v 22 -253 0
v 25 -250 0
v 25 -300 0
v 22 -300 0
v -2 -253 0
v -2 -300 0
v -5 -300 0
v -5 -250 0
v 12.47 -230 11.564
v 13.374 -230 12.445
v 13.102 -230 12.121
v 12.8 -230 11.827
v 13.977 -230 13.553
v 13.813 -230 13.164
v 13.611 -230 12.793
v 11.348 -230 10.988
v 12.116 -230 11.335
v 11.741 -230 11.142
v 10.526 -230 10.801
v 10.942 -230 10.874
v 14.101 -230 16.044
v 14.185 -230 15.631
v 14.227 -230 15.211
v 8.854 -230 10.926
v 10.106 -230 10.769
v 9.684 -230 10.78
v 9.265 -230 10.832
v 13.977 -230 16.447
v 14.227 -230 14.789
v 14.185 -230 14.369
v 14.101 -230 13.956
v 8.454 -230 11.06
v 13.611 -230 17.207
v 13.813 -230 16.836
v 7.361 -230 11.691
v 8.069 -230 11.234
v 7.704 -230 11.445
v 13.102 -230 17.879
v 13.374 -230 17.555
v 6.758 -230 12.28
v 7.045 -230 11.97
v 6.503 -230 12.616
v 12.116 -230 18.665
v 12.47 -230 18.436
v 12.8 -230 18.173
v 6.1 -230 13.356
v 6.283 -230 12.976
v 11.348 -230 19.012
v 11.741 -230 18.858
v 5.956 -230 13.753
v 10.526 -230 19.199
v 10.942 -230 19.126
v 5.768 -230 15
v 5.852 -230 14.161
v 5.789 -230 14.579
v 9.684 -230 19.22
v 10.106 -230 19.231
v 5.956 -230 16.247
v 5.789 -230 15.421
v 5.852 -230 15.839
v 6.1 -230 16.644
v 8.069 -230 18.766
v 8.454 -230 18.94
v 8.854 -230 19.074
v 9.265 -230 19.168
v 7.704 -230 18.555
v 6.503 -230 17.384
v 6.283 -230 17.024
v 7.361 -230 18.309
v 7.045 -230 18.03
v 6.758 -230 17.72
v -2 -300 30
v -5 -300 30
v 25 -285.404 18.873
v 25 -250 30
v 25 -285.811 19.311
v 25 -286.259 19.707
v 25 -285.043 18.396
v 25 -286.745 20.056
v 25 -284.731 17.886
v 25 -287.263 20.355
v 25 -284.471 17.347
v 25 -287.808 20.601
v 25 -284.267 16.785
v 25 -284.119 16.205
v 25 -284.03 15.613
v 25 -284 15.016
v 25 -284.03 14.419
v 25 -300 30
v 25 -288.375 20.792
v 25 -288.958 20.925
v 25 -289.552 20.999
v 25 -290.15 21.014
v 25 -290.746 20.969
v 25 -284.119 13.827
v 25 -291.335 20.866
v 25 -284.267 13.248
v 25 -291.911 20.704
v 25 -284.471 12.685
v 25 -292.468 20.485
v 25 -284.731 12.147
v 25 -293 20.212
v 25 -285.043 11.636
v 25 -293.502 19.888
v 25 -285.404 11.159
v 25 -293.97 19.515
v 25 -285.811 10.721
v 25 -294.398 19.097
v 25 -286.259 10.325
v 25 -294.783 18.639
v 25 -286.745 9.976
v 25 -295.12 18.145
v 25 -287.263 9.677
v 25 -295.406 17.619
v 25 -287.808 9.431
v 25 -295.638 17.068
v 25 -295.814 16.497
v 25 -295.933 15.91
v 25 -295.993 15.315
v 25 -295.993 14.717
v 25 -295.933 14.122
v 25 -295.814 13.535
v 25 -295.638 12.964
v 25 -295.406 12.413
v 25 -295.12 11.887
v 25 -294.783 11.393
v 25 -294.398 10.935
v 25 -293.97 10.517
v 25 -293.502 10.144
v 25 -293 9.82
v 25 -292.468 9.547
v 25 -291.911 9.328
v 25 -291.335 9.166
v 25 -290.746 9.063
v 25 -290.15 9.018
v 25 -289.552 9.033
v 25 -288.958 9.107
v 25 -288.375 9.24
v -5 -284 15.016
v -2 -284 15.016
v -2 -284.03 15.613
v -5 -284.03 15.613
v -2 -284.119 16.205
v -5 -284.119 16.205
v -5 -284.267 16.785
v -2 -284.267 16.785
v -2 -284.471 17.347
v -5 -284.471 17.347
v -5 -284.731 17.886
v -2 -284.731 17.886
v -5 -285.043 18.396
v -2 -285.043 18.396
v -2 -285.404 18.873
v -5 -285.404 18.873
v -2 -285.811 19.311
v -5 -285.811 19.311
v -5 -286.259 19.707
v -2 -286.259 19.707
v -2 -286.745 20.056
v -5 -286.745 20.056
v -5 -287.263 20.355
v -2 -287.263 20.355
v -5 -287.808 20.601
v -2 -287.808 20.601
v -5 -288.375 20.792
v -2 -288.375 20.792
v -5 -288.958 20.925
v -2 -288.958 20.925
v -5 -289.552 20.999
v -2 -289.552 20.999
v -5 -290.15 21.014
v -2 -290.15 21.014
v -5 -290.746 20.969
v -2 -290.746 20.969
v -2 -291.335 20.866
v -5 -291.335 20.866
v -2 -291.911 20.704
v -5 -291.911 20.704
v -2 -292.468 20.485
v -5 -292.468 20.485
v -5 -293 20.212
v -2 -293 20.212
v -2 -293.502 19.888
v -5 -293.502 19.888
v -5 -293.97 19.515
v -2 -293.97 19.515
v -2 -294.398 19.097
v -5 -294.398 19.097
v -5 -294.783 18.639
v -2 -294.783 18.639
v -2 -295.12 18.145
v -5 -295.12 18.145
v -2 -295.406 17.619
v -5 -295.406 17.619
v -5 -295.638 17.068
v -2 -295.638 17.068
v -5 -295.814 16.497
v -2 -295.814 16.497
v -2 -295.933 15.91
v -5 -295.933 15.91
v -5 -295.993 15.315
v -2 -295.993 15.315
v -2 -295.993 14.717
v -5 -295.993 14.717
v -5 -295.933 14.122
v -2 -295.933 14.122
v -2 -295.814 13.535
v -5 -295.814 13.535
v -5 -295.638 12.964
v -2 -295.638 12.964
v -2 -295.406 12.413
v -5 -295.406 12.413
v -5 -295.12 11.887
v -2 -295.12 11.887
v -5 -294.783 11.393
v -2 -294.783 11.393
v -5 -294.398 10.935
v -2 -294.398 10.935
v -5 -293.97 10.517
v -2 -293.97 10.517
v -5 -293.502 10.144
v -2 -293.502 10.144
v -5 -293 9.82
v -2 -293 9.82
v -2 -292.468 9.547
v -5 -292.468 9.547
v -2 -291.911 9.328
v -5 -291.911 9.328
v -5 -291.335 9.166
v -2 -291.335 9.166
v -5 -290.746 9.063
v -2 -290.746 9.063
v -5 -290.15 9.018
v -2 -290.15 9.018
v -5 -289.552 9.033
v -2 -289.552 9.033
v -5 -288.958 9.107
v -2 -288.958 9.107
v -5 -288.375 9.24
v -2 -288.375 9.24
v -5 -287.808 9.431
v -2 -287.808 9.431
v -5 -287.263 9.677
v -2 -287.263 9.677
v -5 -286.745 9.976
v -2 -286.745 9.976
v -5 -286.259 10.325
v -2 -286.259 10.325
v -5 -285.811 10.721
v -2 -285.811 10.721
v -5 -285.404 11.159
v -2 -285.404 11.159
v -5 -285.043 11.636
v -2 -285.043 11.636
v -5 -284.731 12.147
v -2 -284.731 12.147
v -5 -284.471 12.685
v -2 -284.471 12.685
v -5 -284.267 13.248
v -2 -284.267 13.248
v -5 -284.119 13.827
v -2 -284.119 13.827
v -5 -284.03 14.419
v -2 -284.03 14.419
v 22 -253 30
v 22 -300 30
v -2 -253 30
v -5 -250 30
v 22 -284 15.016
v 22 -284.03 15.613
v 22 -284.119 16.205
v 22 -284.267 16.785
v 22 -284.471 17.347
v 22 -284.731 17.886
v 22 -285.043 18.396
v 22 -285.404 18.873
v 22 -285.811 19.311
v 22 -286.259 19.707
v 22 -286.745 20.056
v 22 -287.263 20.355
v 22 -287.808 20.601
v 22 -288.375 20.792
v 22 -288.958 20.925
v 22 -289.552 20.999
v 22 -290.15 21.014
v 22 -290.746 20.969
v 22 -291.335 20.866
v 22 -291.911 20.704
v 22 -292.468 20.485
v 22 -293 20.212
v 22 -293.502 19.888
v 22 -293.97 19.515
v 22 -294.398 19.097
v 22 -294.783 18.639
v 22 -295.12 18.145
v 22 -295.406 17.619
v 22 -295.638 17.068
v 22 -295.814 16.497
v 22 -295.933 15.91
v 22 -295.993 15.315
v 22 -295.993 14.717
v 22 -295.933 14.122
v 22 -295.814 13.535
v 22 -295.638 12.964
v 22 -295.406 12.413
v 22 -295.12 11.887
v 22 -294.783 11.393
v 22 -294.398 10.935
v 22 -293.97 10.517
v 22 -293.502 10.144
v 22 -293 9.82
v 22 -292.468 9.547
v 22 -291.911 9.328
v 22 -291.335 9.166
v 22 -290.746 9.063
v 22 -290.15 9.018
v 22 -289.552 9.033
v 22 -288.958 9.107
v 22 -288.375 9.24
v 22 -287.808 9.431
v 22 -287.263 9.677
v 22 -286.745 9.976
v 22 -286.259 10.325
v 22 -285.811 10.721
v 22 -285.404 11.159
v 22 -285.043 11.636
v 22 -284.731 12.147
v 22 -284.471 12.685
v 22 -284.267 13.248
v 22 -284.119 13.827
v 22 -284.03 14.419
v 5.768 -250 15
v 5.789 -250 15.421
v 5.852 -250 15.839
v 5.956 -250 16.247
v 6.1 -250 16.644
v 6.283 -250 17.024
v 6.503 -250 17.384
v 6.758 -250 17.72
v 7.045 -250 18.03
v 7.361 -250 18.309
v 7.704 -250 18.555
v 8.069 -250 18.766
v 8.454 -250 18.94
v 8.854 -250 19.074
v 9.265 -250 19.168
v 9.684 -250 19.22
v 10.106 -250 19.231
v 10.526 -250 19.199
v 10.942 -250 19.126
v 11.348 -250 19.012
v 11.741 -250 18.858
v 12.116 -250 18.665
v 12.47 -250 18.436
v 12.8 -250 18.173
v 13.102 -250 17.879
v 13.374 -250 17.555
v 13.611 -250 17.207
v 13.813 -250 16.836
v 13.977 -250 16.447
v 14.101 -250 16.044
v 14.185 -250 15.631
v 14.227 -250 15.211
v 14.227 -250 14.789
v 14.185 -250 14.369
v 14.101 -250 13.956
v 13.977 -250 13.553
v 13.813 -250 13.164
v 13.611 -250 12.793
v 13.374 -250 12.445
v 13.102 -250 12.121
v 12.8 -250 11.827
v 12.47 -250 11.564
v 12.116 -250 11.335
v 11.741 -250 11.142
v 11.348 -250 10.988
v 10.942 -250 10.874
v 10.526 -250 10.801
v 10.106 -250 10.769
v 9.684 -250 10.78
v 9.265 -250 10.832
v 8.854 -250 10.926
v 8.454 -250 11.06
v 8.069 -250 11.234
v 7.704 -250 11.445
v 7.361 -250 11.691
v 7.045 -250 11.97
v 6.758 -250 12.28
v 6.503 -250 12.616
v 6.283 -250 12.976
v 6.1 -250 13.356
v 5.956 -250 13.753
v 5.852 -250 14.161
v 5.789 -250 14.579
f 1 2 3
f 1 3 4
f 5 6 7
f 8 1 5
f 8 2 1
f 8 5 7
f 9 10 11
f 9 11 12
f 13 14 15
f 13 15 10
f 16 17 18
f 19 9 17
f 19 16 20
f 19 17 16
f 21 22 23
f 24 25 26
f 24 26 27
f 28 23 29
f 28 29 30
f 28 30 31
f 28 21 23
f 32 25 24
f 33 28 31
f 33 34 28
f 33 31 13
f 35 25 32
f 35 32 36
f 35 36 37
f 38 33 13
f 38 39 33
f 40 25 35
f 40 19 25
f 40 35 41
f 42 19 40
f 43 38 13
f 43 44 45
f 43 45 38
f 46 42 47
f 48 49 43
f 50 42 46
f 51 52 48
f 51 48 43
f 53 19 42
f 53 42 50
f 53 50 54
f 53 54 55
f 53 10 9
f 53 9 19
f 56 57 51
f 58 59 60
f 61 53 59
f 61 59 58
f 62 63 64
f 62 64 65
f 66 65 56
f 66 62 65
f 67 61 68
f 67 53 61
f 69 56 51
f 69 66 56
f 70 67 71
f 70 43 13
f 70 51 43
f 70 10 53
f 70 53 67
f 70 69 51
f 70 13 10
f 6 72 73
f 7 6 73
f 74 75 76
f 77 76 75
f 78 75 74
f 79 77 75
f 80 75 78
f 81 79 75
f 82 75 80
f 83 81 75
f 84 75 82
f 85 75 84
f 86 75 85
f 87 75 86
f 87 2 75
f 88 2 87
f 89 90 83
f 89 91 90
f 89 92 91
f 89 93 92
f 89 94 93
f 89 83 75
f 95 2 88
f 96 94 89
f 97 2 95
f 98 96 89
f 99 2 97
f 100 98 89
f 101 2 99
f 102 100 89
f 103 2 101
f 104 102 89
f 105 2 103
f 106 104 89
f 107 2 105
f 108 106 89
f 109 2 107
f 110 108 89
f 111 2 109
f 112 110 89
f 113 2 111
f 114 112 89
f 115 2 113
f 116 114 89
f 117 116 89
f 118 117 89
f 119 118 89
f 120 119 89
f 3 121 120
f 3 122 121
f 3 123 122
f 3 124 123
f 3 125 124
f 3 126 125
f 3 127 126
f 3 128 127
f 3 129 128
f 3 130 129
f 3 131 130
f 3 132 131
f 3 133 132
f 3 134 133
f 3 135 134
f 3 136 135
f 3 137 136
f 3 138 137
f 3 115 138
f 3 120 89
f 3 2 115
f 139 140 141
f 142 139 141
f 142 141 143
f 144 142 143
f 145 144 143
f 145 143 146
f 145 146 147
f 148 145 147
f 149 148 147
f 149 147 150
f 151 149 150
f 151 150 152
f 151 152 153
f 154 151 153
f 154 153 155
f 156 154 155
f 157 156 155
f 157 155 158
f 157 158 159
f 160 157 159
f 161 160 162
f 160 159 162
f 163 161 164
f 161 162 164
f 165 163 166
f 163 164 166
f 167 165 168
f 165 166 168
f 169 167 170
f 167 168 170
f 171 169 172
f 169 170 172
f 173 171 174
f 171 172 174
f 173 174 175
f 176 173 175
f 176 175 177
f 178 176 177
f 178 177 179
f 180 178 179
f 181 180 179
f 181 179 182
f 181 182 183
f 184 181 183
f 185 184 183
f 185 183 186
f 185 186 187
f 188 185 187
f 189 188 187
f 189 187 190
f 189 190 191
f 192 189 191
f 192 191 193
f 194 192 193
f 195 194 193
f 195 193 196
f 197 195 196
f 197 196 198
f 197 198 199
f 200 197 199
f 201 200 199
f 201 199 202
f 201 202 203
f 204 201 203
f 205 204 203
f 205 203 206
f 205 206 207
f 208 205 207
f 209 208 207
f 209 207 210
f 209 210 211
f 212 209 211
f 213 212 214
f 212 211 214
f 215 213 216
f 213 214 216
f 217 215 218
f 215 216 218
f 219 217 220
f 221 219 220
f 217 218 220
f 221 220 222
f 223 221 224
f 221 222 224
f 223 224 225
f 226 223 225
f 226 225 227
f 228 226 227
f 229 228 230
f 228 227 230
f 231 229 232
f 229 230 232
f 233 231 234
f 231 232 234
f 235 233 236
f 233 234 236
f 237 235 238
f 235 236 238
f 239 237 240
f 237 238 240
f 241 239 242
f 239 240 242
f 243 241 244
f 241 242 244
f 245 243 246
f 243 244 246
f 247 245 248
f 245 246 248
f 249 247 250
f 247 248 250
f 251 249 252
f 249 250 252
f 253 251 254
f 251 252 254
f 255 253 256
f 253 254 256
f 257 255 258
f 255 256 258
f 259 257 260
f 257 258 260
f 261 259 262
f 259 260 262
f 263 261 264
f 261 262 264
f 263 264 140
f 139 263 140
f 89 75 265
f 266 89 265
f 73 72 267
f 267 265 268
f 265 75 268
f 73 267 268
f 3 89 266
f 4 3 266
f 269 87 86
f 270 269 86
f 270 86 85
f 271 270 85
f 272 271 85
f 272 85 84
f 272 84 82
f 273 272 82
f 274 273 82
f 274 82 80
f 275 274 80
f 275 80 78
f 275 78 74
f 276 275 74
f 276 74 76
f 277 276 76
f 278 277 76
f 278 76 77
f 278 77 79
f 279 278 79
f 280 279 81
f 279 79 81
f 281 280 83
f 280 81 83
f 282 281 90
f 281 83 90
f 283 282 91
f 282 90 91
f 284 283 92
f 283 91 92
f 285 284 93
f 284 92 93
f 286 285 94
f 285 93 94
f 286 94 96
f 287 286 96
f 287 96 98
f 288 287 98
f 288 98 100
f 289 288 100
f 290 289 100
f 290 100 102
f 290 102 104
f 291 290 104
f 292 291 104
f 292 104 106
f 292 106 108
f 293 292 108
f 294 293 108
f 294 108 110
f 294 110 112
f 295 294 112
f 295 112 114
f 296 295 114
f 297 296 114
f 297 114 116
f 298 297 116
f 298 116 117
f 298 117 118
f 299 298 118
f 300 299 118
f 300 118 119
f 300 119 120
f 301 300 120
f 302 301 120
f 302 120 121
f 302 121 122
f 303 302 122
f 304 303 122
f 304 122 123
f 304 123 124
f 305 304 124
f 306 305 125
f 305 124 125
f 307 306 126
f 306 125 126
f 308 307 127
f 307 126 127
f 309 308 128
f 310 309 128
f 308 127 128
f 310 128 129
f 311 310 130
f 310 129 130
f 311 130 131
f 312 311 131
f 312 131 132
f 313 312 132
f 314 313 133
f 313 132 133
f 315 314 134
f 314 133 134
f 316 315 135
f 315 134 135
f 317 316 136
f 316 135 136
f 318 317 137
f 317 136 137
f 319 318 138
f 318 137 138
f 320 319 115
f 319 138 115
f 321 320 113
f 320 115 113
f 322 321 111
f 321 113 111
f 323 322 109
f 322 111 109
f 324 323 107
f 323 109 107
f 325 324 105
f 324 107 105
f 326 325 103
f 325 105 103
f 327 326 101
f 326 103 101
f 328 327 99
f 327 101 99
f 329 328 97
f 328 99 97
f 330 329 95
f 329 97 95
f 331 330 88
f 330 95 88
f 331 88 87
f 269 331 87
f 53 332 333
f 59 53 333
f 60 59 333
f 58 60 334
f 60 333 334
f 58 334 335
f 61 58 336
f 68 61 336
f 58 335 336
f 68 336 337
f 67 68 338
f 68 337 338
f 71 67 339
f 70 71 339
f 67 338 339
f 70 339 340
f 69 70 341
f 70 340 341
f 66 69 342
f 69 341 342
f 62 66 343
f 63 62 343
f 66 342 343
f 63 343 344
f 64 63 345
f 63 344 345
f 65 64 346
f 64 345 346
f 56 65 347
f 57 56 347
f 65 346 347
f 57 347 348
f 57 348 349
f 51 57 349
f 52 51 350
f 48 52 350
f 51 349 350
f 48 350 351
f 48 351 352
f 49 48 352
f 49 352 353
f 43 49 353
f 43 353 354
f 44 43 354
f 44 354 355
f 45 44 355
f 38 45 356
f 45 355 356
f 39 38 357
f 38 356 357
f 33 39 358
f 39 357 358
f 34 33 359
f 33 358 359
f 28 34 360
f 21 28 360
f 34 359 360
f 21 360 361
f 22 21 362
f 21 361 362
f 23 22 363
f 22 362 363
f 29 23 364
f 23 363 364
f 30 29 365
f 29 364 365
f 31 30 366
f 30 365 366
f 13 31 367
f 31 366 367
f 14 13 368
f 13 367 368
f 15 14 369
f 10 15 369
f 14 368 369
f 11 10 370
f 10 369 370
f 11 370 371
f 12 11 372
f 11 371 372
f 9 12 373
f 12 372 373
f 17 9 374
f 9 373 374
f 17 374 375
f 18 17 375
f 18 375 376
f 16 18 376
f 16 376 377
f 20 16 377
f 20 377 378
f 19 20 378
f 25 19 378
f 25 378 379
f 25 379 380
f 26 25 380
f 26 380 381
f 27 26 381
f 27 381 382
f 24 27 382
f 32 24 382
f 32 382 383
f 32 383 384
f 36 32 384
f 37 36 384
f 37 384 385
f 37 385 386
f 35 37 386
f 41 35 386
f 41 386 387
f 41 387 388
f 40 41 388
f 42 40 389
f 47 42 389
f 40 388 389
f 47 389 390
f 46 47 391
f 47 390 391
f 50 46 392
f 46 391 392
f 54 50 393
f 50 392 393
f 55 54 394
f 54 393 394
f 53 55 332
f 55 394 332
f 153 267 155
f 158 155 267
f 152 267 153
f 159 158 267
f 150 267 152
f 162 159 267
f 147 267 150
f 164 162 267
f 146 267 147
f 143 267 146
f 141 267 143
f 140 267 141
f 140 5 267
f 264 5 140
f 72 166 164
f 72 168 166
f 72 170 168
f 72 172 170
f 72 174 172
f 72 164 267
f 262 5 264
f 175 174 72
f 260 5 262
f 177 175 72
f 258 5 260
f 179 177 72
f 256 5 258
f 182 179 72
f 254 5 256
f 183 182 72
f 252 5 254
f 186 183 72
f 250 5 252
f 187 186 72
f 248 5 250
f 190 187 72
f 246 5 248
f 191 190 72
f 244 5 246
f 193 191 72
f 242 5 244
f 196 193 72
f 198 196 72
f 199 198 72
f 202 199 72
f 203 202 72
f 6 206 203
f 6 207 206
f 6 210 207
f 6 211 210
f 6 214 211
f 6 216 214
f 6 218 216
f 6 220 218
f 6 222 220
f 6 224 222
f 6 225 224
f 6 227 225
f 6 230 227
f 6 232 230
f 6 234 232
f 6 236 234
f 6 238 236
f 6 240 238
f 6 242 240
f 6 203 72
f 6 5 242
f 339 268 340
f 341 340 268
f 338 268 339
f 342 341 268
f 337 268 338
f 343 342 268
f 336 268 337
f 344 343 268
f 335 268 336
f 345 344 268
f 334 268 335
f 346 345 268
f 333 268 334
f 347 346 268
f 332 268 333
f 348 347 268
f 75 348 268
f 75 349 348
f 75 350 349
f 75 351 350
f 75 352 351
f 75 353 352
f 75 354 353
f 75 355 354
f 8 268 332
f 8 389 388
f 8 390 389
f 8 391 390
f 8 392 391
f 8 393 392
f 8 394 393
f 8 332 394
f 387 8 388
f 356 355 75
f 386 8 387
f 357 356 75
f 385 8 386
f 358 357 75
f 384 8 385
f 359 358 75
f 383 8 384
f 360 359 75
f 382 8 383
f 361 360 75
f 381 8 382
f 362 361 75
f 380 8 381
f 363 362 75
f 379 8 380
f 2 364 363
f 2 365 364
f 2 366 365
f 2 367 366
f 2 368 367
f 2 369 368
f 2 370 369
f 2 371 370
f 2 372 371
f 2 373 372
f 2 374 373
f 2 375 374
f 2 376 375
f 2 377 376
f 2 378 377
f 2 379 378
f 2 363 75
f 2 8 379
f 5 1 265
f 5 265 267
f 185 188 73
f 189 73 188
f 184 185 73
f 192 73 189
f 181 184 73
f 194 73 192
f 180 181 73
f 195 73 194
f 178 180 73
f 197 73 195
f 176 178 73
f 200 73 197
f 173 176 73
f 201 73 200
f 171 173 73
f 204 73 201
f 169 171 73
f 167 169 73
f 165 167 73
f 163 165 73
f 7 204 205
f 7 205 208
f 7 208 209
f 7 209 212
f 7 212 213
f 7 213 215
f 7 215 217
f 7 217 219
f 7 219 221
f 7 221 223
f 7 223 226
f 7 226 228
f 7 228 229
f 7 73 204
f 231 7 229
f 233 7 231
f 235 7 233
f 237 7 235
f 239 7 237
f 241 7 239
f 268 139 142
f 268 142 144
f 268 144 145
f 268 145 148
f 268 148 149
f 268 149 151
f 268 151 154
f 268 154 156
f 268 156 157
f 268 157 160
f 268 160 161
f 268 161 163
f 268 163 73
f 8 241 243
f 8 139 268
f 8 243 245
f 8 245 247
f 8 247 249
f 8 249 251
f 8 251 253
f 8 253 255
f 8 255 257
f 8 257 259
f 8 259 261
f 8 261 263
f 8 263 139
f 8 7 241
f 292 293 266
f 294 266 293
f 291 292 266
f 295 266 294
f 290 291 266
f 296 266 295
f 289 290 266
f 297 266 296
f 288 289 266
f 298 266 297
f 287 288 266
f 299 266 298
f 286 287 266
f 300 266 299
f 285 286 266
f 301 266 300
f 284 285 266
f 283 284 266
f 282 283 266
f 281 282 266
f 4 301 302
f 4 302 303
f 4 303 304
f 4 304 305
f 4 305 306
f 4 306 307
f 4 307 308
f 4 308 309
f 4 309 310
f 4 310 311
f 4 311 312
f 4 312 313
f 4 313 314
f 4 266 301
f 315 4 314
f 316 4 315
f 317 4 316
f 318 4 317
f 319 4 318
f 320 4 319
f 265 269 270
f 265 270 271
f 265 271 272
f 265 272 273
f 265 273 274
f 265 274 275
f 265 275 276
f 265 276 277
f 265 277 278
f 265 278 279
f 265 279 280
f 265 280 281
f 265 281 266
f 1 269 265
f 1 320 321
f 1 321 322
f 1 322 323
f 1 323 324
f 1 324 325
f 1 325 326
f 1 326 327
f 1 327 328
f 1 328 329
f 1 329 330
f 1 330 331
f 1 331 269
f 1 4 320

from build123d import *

# Parameters (mm, degrees)
PAD003_DEPTH = 30
SKETCH005_R  = 6
POCKET_DEPTH = 30.001
SKETCH006_R  = 4.232151
PAD004_DEPTH = 20


with BuildPart() as part:
    # Sketch004 → Pad003 (new body)
    with BuildSketch(Plane.XY):
        Polygon((-12, 0), (-15, 0), (-15, 50), (15, 50), (15, 0), (12, 0), (12, 47), (-12, 47), align=None)
    extrude(amount=PAD003_DEPTH)

    # Sketch005 (on DatumPlane) → Pocket (cut, through all)
    with BuildSketch(Plane.YZ.offset(15)):
        with Locations((10, 15.016033)):
            Circle(SKETCH005_R)
    extrude(amount=-POCKET_DEPTH, mode=Mode.SUBTRACT)

    # Sketch006 (on DatumPlane) → Pad004 (join)
    with BuildSketch(Plane(origin=(0, 50, 0), x_dir=(-1, 0, 0), z_dir=(0, 1, 0))):
        with Locations((0, 15)):
            Circle(SKETCH006_R)
    extrude(amount=PAD004_DEPTH)


with BuildPart() as part_1:
    # Body009 placement: moved
    add(part.part.moved(Location((10, -300, 0))))


solid = part_1.part
